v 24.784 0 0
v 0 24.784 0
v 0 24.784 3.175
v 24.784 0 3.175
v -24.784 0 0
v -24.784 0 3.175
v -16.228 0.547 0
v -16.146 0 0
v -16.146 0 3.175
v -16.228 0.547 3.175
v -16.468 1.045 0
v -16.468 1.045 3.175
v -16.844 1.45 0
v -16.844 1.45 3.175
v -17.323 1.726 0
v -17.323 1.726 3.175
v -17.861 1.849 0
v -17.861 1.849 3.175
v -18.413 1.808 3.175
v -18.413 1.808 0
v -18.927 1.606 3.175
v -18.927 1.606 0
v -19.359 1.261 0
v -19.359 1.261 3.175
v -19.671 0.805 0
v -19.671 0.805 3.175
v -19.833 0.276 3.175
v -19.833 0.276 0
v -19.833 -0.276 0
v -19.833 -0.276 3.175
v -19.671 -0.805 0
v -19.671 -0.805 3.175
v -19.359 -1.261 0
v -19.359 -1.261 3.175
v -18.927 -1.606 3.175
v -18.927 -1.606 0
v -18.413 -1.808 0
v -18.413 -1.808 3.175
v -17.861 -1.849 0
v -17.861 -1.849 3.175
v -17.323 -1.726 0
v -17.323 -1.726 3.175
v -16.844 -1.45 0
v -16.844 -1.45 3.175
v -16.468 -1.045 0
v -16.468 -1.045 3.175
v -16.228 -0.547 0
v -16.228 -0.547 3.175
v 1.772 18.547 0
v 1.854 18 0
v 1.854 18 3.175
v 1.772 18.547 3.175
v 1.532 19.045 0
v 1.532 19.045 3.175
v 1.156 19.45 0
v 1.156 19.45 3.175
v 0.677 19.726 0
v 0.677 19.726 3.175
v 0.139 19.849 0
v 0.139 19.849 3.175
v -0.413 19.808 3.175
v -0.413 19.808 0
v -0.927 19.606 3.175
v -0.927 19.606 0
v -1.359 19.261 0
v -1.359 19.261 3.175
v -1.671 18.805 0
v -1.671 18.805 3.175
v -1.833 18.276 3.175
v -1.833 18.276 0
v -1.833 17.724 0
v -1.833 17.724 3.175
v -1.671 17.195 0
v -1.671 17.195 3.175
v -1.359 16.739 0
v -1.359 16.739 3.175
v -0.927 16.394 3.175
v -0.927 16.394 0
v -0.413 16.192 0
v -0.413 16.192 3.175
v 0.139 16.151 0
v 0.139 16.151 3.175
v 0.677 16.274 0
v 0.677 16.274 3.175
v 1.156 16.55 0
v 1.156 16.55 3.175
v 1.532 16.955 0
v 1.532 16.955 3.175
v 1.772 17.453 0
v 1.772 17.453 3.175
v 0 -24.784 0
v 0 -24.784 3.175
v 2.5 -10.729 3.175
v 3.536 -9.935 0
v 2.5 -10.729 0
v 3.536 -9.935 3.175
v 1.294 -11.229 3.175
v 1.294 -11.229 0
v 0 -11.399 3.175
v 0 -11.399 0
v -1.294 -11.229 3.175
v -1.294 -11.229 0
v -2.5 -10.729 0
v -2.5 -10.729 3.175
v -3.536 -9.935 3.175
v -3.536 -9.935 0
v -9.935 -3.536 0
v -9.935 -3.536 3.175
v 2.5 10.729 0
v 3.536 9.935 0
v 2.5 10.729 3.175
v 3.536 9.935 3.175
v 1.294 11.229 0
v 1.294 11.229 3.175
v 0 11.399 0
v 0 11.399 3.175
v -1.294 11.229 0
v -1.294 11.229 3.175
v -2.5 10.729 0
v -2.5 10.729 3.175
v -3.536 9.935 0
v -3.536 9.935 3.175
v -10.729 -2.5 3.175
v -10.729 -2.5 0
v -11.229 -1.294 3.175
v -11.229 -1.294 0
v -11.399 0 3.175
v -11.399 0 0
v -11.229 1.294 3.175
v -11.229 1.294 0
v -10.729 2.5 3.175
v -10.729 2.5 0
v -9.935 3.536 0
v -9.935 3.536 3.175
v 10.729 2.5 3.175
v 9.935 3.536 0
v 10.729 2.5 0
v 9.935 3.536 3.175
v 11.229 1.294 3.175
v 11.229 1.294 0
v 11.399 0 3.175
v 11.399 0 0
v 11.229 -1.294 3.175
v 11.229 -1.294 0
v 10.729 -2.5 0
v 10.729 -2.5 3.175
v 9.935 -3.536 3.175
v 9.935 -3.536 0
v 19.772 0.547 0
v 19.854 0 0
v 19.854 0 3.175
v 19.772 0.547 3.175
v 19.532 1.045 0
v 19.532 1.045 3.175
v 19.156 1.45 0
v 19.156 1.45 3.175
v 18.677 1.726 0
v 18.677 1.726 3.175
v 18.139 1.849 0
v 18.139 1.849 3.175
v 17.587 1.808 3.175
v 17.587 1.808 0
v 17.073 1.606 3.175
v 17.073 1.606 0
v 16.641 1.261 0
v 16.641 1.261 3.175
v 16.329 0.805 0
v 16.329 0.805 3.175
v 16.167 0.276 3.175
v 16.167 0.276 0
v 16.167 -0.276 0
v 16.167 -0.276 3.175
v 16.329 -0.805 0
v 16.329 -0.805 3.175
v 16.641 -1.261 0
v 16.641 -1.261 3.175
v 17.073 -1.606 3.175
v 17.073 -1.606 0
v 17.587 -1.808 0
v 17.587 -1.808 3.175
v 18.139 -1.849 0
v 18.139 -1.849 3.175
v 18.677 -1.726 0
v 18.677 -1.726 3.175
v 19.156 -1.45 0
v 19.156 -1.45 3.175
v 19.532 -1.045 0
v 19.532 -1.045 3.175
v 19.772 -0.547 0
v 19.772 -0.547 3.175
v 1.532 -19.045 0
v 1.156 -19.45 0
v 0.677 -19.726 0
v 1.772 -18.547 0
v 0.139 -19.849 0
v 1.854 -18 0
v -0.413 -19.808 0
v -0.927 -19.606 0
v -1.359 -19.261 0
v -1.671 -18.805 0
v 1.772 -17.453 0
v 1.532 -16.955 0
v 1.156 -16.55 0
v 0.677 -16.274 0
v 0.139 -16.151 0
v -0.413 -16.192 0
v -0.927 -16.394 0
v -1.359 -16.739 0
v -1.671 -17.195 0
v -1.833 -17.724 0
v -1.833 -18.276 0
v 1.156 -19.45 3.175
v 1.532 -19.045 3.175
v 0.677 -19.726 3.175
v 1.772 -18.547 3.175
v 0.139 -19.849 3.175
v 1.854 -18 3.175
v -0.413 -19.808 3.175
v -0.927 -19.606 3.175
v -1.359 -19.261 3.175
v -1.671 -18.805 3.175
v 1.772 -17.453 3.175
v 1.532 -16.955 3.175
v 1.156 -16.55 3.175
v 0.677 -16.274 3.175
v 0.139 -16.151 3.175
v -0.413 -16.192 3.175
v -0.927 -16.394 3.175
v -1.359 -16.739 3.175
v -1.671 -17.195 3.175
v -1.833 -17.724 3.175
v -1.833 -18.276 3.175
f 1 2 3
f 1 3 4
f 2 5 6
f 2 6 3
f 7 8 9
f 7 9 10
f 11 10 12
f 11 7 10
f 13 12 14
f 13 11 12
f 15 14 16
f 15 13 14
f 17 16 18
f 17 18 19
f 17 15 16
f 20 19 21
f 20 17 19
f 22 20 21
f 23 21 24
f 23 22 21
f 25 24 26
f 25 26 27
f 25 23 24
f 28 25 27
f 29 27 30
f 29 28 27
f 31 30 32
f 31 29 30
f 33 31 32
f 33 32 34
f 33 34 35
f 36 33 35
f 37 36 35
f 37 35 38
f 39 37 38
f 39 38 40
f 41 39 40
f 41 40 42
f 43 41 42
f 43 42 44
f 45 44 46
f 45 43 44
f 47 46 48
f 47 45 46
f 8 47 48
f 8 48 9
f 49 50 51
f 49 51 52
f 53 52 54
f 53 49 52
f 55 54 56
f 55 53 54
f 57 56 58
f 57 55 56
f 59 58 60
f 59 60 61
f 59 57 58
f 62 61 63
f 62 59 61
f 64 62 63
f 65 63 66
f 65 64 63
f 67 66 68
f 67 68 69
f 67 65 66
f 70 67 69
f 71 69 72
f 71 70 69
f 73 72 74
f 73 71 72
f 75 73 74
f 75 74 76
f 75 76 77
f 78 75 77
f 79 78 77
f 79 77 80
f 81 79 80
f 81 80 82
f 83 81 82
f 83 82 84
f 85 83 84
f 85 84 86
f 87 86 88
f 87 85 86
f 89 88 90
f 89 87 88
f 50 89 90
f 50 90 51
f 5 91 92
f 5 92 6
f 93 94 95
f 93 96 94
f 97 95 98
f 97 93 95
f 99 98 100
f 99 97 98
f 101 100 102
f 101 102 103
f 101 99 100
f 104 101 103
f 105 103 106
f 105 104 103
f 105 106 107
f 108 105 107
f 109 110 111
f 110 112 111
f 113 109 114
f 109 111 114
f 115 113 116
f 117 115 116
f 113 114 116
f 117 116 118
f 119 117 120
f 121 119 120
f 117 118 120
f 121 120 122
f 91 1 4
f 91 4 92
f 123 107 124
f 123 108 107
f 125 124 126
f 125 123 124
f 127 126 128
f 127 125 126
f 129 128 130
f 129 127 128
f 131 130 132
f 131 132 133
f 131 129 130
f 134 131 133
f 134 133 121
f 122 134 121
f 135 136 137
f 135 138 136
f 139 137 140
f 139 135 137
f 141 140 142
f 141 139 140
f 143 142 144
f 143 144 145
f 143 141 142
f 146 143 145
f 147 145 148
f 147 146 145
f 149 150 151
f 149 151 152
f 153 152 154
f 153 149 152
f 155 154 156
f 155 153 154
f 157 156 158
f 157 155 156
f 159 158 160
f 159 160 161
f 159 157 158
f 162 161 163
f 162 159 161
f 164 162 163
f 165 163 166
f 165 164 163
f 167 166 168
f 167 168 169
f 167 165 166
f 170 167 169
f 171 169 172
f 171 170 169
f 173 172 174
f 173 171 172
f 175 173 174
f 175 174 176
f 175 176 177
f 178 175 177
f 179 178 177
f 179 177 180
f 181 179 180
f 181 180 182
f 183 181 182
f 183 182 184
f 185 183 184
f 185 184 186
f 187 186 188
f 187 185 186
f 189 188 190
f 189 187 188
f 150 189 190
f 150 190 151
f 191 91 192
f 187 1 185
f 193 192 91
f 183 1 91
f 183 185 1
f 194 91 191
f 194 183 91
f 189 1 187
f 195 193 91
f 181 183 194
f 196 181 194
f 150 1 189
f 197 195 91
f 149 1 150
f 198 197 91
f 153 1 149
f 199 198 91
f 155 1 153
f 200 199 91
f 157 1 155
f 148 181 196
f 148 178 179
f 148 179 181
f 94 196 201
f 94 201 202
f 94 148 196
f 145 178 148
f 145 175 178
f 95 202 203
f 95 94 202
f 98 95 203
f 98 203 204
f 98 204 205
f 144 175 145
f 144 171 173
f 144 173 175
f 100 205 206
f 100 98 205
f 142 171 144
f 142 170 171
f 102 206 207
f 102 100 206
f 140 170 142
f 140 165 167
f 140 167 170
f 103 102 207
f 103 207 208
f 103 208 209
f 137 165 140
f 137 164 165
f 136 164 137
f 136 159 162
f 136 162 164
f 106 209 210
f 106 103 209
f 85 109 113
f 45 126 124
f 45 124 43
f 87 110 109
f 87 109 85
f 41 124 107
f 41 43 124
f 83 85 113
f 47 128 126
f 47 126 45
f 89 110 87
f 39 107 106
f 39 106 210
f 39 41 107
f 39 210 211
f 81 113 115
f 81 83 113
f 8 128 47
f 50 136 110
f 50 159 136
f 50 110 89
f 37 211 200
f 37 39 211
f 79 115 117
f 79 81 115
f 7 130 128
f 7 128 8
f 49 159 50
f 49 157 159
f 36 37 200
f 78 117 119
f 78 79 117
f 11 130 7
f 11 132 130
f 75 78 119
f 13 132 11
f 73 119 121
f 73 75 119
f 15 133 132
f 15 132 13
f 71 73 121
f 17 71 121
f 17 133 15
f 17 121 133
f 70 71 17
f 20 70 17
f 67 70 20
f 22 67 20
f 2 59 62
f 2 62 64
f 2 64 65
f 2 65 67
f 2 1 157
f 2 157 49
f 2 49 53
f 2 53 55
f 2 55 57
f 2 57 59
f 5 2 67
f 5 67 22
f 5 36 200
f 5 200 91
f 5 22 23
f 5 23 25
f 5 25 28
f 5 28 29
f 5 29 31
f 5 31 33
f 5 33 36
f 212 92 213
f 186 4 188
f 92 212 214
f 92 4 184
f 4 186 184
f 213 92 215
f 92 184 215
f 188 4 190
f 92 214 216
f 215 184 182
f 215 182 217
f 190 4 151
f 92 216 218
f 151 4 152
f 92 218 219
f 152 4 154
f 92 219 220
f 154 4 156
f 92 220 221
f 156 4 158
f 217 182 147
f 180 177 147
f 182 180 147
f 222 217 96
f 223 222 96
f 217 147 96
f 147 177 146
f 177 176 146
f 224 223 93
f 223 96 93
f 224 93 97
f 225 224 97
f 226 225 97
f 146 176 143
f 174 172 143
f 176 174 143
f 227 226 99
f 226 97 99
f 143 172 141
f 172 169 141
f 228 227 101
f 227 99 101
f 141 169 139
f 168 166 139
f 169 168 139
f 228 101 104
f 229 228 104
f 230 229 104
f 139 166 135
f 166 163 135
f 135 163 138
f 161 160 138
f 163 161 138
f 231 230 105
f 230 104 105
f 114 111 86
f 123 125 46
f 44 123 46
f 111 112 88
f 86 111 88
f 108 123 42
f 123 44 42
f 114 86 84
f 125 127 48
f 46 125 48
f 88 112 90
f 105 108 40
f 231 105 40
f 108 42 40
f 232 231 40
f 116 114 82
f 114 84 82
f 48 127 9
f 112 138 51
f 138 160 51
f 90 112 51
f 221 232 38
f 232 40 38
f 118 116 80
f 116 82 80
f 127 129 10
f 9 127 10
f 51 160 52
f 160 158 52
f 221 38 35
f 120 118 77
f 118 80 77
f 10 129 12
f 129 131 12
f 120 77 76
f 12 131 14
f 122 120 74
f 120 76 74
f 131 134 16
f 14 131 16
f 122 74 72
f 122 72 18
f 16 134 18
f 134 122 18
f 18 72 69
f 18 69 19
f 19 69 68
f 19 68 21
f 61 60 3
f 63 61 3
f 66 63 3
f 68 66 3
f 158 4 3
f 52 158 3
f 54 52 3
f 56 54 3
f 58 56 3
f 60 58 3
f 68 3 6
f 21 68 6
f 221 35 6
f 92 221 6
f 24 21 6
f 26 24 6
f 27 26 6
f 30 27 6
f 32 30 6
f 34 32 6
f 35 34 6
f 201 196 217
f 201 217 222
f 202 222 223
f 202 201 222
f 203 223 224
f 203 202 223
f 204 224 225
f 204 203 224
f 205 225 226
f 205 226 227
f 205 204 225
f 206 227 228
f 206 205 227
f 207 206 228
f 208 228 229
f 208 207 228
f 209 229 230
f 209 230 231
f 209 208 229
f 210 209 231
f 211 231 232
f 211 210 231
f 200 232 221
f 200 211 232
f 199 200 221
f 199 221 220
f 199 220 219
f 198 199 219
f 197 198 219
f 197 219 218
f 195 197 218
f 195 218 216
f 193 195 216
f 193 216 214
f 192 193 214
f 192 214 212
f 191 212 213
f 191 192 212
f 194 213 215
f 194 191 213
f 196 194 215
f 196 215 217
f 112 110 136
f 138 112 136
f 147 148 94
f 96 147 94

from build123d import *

# Parameters (mm, degrees)
SKETCH2_R           = 1.8542
BOSS_EXTRUDE1_DEPTH = 3.175
FILLET1_R           = 5


with BuildPart() as part:
    # Sketch2 → Boss-Extrude1 (new body)
    with BuildSketch(Plane.XY):
        Polygon((0, 24.784092681), (24.784092681, 0), (0, -24.784092681), (-24.784092681, 0), align=None)
        with Locations((0, 18)):
            Circle(SKETCH2_R, mode=Mode.SUBTRACT)
        with Locations((-18, 0)):
            Circle(SKETCH2_R, mode=Mode.SUBTRACT)
        with Locations((0, -18)):
            Circle(SKETCH2_R, mode=Mode.SUBTRACT)
        with Locations((18, 0)):
            Circle(SKETCH2_R, mode=Mode.SUBTRACT)
        Polygon((0, 13.470384182), (13.470384182, 0), (0, -13.470384182), (-13.470384182, 0), align=None, mode=Mode.SUBTRACT)
    extrude(amount=BOSS_EXTRUDE1_DEPTH)

    # Fillet1
    fillet1_edges = [part.edges().sort_by_distance(p)[0] for p in [
        (0, 13.470384182, 1.5875),
        (-13.470384182, 0, 1.5875),
        (0, -13.470384182, 1.5875),
        (13.470384182, 0, 1.5875),
    ]]
    fillet(fillet1_edges, radius=FILLET1_R)


solid = part.part
